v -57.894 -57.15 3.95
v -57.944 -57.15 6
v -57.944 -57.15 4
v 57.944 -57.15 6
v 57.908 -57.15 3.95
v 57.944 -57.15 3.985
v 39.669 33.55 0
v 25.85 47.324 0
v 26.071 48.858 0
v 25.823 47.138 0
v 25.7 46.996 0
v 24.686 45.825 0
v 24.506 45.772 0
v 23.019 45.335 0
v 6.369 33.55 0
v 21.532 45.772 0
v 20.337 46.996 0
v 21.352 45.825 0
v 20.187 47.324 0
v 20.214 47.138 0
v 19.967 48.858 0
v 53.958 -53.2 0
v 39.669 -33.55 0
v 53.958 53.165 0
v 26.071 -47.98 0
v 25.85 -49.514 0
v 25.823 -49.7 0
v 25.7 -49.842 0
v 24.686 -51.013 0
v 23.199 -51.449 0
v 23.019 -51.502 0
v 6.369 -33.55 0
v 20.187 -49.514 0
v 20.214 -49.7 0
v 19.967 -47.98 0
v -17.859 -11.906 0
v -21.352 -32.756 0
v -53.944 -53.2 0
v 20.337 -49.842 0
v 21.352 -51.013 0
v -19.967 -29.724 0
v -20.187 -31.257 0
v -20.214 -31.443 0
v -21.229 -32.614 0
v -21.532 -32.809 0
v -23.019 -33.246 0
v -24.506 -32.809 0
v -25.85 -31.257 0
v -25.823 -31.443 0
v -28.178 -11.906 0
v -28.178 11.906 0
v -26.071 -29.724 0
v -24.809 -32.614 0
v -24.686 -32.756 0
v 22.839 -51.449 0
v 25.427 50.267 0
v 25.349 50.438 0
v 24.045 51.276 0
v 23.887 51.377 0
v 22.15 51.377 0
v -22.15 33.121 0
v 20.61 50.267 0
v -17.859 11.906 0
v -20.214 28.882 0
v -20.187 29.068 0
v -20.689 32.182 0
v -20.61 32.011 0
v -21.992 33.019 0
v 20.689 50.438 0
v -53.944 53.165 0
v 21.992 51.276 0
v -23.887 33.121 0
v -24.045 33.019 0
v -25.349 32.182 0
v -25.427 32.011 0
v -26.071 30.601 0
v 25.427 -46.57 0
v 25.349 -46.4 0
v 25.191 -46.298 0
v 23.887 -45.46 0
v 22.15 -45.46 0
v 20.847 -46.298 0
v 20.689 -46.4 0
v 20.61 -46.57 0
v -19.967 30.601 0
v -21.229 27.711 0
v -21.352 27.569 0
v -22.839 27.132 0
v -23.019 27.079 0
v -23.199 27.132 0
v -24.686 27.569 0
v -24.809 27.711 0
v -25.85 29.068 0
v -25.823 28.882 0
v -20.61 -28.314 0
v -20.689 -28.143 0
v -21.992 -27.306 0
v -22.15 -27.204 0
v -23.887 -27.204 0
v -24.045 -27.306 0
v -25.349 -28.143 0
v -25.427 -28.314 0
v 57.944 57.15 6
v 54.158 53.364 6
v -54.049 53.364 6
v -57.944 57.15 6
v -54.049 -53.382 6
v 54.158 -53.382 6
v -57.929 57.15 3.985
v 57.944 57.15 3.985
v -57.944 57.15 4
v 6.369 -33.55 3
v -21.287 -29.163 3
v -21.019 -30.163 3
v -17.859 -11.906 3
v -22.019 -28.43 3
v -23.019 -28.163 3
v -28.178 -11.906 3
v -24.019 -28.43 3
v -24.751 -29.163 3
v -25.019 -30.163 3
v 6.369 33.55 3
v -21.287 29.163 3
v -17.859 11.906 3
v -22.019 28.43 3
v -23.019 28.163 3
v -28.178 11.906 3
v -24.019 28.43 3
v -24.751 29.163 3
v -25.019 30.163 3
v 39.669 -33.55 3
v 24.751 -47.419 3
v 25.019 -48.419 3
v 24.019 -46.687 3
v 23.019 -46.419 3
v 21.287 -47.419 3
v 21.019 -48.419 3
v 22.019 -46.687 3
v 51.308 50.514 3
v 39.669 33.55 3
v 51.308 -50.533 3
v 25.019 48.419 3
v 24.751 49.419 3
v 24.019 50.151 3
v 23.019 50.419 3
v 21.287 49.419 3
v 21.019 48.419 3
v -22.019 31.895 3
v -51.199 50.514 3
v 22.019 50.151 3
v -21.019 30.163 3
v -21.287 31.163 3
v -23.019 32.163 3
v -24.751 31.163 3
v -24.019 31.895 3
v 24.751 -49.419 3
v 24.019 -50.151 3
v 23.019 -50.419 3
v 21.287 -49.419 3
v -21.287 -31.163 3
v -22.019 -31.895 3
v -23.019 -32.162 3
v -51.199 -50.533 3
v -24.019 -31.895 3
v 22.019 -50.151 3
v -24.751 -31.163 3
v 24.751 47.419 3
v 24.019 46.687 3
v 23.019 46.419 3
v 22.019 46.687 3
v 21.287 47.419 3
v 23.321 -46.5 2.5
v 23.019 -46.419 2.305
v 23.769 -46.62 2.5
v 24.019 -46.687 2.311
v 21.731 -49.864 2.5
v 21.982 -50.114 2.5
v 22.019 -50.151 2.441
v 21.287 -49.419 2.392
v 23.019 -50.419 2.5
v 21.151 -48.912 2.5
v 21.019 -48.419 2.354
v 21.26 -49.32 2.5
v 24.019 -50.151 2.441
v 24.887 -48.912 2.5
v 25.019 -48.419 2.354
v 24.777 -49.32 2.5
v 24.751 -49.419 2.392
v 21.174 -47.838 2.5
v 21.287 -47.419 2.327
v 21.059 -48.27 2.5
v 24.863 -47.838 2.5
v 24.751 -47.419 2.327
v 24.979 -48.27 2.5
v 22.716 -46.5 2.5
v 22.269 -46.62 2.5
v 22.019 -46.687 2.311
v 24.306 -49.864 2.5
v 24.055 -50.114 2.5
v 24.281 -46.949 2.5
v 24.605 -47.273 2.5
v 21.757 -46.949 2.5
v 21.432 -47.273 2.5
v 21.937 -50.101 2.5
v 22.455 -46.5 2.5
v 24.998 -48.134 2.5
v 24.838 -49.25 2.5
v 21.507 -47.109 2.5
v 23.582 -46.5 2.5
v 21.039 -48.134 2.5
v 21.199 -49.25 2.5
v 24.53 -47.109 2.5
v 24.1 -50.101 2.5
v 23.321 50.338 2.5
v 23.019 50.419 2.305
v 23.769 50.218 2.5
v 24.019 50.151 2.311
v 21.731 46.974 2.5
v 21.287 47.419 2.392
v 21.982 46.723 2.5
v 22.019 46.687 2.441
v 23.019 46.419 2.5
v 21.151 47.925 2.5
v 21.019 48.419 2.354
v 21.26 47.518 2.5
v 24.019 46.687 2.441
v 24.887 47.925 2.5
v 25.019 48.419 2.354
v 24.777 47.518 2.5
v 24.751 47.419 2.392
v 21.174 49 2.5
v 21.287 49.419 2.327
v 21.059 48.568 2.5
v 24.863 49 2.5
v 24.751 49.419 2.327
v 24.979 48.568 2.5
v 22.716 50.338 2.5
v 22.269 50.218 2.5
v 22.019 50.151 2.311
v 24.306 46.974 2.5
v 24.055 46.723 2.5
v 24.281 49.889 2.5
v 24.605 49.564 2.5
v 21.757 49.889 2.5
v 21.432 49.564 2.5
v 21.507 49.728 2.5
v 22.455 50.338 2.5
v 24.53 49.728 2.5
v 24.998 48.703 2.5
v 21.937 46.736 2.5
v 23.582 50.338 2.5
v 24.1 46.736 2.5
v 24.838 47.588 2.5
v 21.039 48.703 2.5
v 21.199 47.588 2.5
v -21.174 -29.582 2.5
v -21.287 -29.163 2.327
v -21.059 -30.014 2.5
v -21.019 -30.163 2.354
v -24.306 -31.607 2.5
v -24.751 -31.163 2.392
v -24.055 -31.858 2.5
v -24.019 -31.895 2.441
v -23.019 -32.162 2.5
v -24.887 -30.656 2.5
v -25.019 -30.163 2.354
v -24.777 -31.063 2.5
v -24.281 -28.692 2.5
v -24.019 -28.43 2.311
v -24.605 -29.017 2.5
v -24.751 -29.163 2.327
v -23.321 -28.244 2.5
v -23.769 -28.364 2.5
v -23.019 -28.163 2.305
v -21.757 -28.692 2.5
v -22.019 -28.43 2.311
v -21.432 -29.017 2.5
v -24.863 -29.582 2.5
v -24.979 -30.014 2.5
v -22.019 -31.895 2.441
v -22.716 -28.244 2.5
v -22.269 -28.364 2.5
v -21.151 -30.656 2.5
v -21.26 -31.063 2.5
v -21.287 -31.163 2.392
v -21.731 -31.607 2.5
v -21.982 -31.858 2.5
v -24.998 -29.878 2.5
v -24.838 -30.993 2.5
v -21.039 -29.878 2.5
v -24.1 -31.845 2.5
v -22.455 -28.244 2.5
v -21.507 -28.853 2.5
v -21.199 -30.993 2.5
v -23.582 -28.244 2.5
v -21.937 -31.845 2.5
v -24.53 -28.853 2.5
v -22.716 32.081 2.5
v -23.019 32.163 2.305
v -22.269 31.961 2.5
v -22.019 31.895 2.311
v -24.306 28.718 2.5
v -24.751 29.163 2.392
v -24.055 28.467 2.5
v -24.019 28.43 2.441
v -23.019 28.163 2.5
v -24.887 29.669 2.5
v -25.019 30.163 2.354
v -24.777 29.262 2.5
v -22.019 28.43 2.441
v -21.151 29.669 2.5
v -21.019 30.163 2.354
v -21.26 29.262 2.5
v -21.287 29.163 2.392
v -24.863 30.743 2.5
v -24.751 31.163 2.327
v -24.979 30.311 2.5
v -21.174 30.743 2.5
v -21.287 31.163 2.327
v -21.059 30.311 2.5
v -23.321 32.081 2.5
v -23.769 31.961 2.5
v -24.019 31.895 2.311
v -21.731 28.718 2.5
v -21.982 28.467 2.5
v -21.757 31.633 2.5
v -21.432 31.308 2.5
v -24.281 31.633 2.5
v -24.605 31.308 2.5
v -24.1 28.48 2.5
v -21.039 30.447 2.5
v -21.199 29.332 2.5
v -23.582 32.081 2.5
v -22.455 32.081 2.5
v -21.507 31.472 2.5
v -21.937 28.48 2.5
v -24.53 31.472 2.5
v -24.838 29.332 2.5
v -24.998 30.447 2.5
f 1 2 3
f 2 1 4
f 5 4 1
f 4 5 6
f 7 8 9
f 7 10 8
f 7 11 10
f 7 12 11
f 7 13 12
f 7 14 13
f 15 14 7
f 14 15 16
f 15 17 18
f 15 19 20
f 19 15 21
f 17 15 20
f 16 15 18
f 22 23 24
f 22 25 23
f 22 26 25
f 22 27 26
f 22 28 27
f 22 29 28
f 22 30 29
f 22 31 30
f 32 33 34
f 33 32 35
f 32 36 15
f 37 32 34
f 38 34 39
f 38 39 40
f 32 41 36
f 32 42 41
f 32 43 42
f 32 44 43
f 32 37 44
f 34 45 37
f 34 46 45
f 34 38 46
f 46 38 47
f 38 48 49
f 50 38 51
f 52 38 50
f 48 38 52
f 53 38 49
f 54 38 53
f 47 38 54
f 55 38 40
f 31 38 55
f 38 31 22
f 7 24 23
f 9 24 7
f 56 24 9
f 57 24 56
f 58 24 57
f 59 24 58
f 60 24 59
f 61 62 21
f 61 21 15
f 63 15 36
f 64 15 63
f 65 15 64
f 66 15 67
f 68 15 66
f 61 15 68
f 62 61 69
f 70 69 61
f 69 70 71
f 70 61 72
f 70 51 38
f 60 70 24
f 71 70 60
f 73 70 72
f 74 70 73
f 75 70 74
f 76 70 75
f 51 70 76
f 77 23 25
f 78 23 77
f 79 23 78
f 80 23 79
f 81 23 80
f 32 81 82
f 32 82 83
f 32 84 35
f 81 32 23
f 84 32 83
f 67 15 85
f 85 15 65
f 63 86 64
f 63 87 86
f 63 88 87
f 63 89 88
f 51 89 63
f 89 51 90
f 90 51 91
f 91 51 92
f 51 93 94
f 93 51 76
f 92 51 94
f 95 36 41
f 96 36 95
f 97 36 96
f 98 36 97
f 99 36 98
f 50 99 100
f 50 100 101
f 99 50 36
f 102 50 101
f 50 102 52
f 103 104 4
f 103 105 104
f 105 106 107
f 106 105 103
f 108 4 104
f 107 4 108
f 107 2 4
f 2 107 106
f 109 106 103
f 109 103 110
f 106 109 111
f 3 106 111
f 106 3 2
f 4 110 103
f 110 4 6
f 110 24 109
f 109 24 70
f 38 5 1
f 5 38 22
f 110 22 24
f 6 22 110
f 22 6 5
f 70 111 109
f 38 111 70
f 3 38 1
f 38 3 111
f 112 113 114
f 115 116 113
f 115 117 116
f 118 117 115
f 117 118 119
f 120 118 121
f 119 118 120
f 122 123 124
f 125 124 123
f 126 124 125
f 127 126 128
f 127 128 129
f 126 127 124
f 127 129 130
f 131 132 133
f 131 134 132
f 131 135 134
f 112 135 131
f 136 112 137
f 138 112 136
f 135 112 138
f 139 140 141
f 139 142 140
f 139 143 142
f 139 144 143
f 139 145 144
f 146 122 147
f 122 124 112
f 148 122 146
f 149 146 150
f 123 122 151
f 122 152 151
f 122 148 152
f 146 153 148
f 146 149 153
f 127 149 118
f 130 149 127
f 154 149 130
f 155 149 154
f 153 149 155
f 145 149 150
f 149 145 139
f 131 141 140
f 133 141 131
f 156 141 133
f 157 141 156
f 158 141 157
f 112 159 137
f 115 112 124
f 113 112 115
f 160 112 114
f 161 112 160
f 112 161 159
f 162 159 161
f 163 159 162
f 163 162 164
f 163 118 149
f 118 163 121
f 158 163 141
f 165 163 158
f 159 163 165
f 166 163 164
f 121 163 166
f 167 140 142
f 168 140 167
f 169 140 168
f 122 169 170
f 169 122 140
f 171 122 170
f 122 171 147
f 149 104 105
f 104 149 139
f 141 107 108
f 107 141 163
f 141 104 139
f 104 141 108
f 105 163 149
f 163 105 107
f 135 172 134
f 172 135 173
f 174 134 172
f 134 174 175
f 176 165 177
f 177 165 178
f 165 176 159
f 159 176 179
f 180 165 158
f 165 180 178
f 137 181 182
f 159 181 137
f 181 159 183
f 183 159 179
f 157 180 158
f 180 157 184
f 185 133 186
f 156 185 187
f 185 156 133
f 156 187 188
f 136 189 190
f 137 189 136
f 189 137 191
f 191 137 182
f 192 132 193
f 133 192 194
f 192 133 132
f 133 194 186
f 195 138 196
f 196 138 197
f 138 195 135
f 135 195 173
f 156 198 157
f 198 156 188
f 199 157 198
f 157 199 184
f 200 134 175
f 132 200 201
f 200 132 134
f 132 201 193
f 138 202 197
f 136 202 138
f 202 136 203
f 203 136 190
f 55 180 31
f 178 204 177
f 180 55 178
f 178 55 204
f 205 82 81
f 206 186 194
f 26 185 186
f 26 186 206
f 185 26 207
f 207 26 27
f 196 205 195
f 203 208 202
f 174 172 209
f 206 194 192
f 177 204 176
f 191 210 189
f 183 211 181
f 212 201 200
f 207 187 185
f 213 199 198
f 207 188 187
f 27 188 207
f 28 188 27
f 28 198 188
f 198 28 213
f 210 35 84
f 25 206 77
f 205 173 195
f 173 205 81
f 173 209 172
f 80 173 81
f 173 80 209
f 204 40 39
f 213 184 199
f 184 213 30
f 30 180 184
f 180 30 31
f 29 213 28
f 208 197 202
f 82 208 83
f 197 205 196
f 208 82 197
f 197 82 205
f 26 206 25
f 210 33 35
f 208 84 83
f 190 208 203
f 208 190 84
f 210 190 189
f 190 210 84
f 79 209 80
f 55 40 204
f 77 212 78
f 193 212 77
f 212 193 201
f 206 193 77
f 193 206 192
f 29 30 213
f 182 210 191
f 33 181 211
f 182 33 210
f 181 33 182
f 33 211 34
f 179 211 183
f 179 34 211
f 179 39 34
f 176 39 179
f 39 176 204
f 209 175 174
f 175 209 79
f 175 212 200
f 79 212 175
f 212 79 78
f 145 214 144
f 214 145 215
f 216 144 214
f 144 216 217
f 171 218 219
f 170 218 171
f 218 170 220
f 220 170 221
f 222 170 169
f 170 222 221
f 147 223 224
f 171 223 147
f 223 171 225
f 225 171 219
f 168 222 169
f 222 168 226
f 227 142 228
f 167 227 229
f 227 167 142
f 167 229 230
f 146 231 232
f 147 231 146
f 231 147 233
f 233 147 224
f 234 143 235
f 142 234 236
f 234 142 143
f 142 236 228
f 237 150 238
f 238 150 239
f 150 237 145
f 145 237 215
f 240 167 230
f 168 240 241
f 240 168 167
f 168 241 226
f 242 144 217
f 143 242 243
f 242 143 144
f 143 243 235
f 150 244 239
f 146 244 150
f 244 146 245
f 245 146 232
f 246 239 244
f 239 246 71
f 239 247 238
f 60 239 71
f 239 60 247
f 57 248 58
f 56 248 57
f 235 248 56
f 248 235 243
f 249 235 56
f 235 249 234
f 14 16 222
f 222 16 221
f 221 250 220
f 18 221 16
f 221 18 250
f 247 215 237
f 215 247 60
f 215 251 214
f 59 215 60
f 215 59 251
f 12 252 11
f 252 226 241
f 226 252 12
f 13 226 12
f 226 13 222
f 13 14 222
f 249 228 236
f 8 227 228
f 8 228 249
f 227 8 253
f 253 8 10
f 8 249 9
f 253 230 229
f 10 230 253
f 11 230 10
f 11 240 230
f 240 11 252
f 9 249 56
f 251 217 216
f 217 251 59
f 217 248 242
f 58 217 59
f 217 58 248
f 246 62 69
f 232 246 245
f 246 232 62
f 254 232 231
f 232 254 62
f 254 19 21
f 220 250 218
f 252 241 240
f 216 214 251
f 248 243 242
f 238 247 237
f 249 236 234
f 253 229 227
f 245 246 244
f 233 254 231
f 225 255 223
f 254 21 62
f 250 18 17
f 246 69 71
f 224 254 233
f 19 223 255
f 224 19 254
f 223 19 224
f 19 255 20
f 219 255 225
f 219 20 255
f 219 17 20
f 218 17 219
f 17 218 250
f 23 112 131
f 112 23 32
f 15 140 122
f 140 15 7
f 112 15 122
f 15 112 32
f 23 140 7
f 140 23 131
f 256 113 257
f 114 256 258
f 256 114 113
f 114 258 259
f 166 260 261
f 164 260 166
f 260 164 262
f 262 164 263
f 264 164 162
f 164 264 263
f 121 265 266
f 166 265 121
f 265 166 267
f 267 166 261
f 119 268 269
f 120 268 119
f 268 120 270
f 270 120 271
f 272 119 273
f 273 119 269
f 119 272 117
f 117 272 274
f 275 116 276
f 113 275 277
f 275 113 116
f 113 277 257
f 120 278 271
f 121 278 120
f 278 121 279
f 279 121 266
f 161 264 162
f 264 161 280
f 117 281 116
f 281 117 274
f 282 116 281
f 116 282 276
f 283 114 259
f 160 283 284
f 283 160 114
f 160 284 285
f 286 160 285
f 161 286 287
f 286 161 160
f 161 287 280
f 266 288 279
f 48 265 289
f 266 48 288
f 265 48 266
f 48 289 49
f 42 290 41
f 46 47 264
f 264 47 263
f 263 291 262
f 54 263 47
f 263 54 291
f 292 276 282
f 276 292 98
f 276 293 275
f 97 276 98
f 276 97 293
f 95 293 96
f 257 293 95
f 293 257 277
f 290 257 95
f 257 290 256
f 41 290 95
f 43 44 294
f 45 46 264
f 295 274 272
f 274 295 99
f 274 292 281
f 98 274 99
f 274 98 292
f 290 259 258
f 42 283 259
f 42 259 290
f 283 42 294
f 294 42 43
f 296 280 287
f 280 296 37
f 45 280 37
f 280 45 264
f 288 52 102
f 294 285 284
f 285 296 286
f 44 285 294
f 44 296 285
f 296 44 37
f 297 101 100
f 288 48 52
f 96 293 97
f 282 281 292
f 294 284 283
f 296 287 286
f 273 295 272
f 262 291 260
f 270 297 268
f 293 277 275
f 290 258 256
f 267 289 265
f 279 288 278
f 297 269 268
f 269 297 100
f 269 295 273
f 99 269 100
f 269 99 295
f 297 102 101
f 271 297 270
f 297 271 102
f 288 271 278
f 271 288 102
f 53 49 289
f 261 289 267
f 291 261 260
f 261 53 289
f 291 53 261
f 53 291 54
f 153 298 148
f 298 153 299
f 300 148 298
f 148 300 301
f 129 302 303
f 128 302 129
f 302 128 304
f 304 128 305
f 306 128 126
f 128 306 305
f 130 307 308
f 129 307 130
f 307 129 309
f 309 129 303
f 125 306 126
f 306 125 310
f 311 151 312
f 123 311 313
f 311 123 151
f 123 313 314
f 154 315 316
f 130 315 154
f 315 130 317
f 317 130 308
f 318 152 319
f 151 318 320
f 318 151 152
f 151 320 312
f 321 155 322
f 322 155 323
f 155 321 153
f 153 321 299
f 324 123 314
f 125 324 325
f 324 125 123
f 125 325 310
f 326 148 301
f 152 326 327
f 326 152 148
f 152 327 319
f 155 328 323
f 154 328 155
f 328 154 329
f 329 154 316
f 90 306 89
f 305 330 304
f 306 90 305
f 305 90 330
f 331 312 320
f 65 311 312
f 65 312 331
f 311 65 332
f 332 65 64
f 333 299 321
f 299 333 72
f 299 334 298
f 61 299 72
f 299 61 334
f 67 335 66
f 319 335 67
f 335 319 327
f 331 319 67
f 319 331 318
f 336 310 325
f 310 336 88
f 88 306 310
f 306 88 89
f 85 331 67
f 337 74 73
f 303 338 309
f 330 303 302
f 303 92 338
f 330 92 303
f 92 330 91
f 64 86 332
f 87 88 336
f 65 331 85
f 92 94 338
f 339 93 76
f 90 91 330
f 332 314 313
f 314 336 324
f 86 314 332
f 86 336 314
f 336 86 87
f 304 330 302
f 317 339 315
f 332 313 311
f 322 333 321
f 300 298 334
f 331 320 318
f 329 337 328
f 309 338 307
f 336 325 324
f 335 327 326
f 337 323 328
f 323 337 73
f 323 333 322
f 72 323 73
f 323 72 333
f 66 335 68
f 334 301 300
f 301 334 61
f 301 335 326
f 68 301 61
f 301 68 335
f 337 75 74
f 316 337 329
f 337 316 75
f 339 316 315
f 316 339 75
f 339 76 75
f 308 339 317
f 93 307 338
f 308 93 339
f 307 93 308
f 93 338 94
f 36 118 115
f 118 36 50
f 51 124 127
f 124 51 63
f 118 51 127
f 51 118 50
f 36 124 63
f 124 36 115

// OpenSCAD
// WALLY - Wall Plate Customizer v1.3
// by TheNewHobbyist 2013 (http://thenewhobbyist.com)
// http://www.thingiverse.com/thing:47956
//
// Most of the connectors used with this thing are panel mount connectors from
// www.DataPro.net I can't vouch for their quality but they did have easy to
// find dimensions for their products so I used them.
//
// This could be tightened up considerably but I thought I'd get it out there for people
// to experiment with before I lose my mind staring at it too long. Also this is my
// first OpenSCAD model so cut me some slack ;)
//
//   Notes:
//
// * The plug types "Duplex Outlet", "Long_Toggle Switch", "Toggle Switch", and "Rocker"
//   will all use the entire plate when selected in top or bottom configuration. The
//   other selection (if not "none" will be selected.
//
// * "None" and "Blank should not be considered equal. if "None" is selected for one of
//   the two holes on a plate the other selection will be centered on that plate. If
//   "Blank" is selected that plug location will remain blank but the other selection
//   will NOT move into a centered position.
//
//	Change Log:
//
//	v1.1
//	UPDATED: Screw hole locations for designer and toggle plate types.
//	UPDATED: Hole size for designer plate type.
//	UPDATED: Outlet hole spacing
//
//	v1.2
//	ADDED: Long Toggle Switch for laird
//
//	v1.3
//	ADDED: 3 new sizes for plate export: Standard, Junior-Jumbo, and Jumbo.
//

  //////////////////////////
 // Customizer Settings: //
//////////////////////////

//How big are we talkin' here?
plate_width = 2; //	[1:5]

// Bigger hole in your wall? Try this
plate_size = 0; // [0:Standard, 1:Junior-Jumbo, 2:Jumbo]

//Pick a plug or full plate type
1st_plate = "rocker";  //	["none":None, "blank":Blank Port, "toggle":Full Plate - Toggle Switch, "long_toggle":Full Plate - Long Toggle Switch, "outlet":Full Plate - Duplex Outlet, "rocker":Full Plate - Rocker/Designer Plate, "keystone1":Keystone Jack, "vga":VGA Port, "hdmi":HDMI Port, "dvi":DVI-I Port, "displayport":Displayport, "cat5e":Cat5e/Cat6 Port, "usb-a":USB-A Port, "usb-b":USB-B Port, "firewire":Firewire IEEE 1394 Port, "db09":DB-09 Port, "ps2":PS2 Port, "f-type": F-Type/Coaxial Port,"svideo":S-Video Port, "stereo":Stereo Headphone Jack]
//Pick a bottom plug type or leave as none
1st_plate_bottom_hole = "none";  //	["none":None, "blank":Blank Port, "keystone1":Keystone Jack, "vga":VGA Port, "hdmi":HDMI Port, "dvi":DVI-I Port, "displayport":Displayport, "cat5e":Cat5e/Cat6 Port, "usb-a":USB-A Port, "usb-b":USB-B Port, "firewire":Firewire IEEE 1394 Port, "db09":DB-09 Port, "ps2":PS2 Port, "f-type": F-Type/Coaxial Port,"svideo":S-Video Port, "stereo":Stereo Headphone Jack]
//Pick a plug or full plate type
2nd_plate = "toggle";  //	["none":None, "blank":Blank Port, "toggle":Full Plate - Toggle Switch, "long_toggle":Full Plate - Long Toggle Switch, "outlet":Full Plate - Duplex Outlet, "rocker":Full Plate - Rocker/Designer Plate, "keystone1":Keystone Jack, "vga":VGA Port, "hdmi":HDMI Port, "dvi":DVI-I Port, "displayport":Displayport, "cat5e":Cat5e/Cat6 Port, "usb-a":USB-A Port, "usb-b":USB-B Port, "firewire":Firewire IEEE 1394 Port, "db09":DB-09 Port, "ps2":PS2 Port, "f-type": F-Type/Coaxial Port,"svideo":S-Video Port, "stereo":Stereo Headphone Jack]
//Pick a bottom plug type or leave as none
2nd_plate_bottom_hole = "none";  //	["none":None, "blank":Blank Port, "keystone1":Keystone Jack, "vga":VGA Port, "hdmi":HDMI Port, "dvi":DVI-I Port, "displayport":Displayport, "cat5e":Cat5e/Cat6 Port, "usb-a":USB-A Port, "usb-b":USB-B Port, "firewire":Firewire IEEE 1394 Port, "db09":DB-09 Port, "ps2":PS2 Port, "f-type": F-Type/Coaxial Port,"svideo":S-Video Port, "stereo":Stereo Headphone Jack]
//Pick a plug or full plate type
3rd_plate = "none";  //	["none":None, "blank":Blank Port, "toggle":Full Plate - Toggle Switch, "long_toggle":Full Plate - Long Toggle Switch, "outlet":Full Plate - Duplex Outlet, "rocker":Full Plate - Rocker/Designer Plate, "keystone1":Keystone Jack, "vga":VGA Port, "hdmi":HDMI Port, "dvi":DVI-I Port, "displayport":Displayport, "cat5e":Cat5e/Cat6 Port, "usb-a":USB-A Port, "usb-b":USB-B Port, "firewire":Firewire IEEE 1394 Port, "db09":DB-09 Port, "ps2":PS2 Port, "f-type": F-Type/Coaxial Port,"svideo":S-Video Port, "stereo":Stereo Headphone Jack]
//Pick a bottom plug type or leave as none
3rd_plate_bottom_hole = "none";  //	["none":None, "blank":Blank Port, "keystone1":Keystone Jack, "vga":VGA Port, "hdmi":HDMI Port, "dvi":DVI-I Port, "displayport":Displayport, "cat5e":Cat5e/Cat6 Port, "usb-a":USB-A Port, "usb-b":USB-B Port, "firewire":Firewire IEEE 1394 Port, "db09":DB-09 Port, "ps2":PS2 Port, "f-type": F-Type/Coaxial Port,"svideo":S-Video Port, "stereo":Stereo Headphone Jack]
//Pick a plug or full plate type
4th_plate = "none";  //["none":None, "blank":Blank Port, "toggle":Full Plate - Toggle Switch, "long_toggle":Full Plate - Long Toggle Switch, "outlet":Full Plate - Duplex Outlet, "rocker":Full Plate - Rocker/Designer Plate, "keystone1":Keystone Jack, "vga":VGA Port, "hdmi":HDMI Port, "dvi":DVI-I Port, "displayport":Displayport, "cat5e":Cat5e/Cat6 Port, "usb-a":USB-A Port, "usb-b":USB-B Port, "firewire":Firewire IEEE 1394 Port, "db09":DB-09 Port, "ps2":PS2 Port, "f-type": F-Type/Coaxial Port,"svideo":S-Video Port, "stereo":Stereo Headphone Jack]
//Pick a bottom plug type or leave as none
4th_plate_bottom_hole = "none";  //	["none":None, "blank":Blank Port, "keystone1":Keystone Jack, "vga":VGA Port, "hdmi":HDMI Port, "dvi":DVI-I Port, "displayport":Displayport, "cat5e":Cat5e/Cat6 Port, "usb-a":USB-A Port, "usb-b":USB-B Port, "firewire":Firewire IEEE 1394 Port, "db09":DB-09 Port, "ps2":PS2 Port, "f-type": F-Type/Coaxial Port,"svideo":S-Video Port, "stereo":Stereo Headphone Jack]
//Pick a plug or full plate type
5th_plate = "none";  //["none":None, "blank":Blank Port, "toggle":Full Plate - Toggle Switch, "long_toggle":Full Plate - Long Toggle Switch, "outlet":Full Plate - Duplex Outlet, "rocker":Full Plate - Rocker/Designer Plate, "keystone1":Keystone Jack, "vga":VGA Port, "hdmi":HDMI Port, "dvi":DVI-I Port, "displayport":Displayport, "cat5e":Cat5e/Cat6 Port, "usb-a":USB-A Port, "usb-b":USB-B Port, "firewire":Firewire IEEE 1394 Port, "db09":DB-09 Port, "ps2":PS2 Port, "f-type": F-Type/Coaxial Port,"svideo":S-Video Port, "stereo":Stereo Headphone Jack]
//Pick a bottom plug type or leave as none
5th_plate_bottom_hole = "none";  //	["none":None, "blank":Blank Port, "keystone1":Keystone Jack, "vga":VGA Port, "hdmi":HDMI Port, "dvi":DVI-I Port, "displayport":Displayport, "cat5e":Cat5e/Cat6 Port, "usb-a":USB-A Port, "usb-b":USB-B Port, "firewire":Firewire IEEE 1394 Port, "db09":DB-09 Port, "ps2":PS2 Port, "f-type": F-Type/Coaxial Port,"svideo":S-Video Port, "stereo":Stereo Headphone Jack]

  //////////////////////
 // Static Settings: //
//////////////////////

module GoAwayCustomizer() {
// This module is here to stop Customizer from picking up the variables below
}

l_offset = [34.925,39.6875,44.45];
r_offset = [34.925,39.6875,44.45];
spacer = [0,0,46.0375,92.075,138.1125,184.15];
solid_plate_width = l_offset[plate_size] + spacer[plate_width] + r_offset[plate_size];

height_sizes = [114.3,123.825,133.35];

height = 114.3; //plate height (static)
gang_width=[0,69.86,115.824,161.925,206.375,254]; // Plate widths (standard)

edgewidth = solid_plate_width + 10; // Bevel setting for top and bottom
rightbevel = solid_plate_width - 4; // Bevel for right side (scales)

left_offset = 34.925; // Offset first hole position
switch_offset = 46.0375; // Offset all additional holes
thinner_offset=[0,0.92,0.95,0.96,0.97,0.973]; // Manual fix for right side wackiness

positions=[height_sizes[plate_size]/2,height_sizes[plate_size]/2 - 14.25,height_sizes[plate_size]/2 + 14.25];

// preview[view:north, tilt:bottom]

  ///////////////////
 // Hole Control: //
///////////////////

module plate1(){
	if (1st_plate == "toggle" || 1st_plate_bottom_hole == "toggle"){
		translate([0,l_offset[plate_size],0]) toggle_screws();
		translate([0,l_offset[plate_size],0]) hole("toggle");
		}
	else if (1st_plate == "long_toggle" || 1st_plate_bottom_hole == "long_toggle"){
		translate([0,l_offset[plate_size],0]) toggle_screws();
		translate([0,l_offset[plate_size],0]) hole("long_toggle");
		}
	else if (1st_plate == "rocker" || 1st_plate_bottom_hole == "rocker"){
		translate([0,l_offset[plate_size],0]) rocker_screws();
		translate([0,l_offset[plate_size],0]) hole("rocker");
		}
	else if (1st_plate == "outlet" || 1st_plate_bottom_hole == "outlet") {
	translate([0,l_offset[plate_size],0]) hole("outlet");
	}
	else if (1st_plate_bottom_hole == "none") {
		translate([0,l_offset[plate_size],0]) box_screws();
		translate([positions[0],l_offset[plate_size],0]) hole(1st_plate);
			}
	else if (1st_plate == "none") {
		translate([0,l_offset[plate_size],0]) box_screws();
		translate([positions[0],l_offset[plate_size],0]) hole(1st_plate_bottom_hole);
			}
	else {
	translate([0,l_offset[plate_size],0]) box_screws();
	translate([positions[1],l_offset[plate_size],0]) hole(1st_plate);
	translate([positions[2],l_offset[plate_size],0]) hole(1st_plate_bottom_hole);
	}
}

module plate2(){
	if (2nd_plate == "toggle" || 2nd_plate_bottom_hole == "toggle"){
		translate([0,l_offset[plate_size] + switch_offset,0]) toggle_screws();
		translate([0,l_offset[plate_size] + switch_offset,0]) hole("toggle");
		}
	else if (2nd_plate == "long_toggle" || 2nd_plate_bottom_hole == "long_toggle"){
		translate([0,l_offset[plate_size] + switch_offset,0]) toggle_screws();
		translate([0,l_offset[plate_size] + switch_offset,0]) hole("long_toggle");
		}
	else if (2nd_plate == "rocker" || 2nd_plate_bottom_hole == "rocker"){
		translate([0,l_offset[plate_size] + switch_offset,0]) rocker_screws();
		translate([0,l_offset[plate_size] + switch_offset,0]) hole("rocker");
		}
	else if (2nd_plate == "outlet" || 2nd_plate_bottom_hole == "outlet") {
	translate([0,l_offset[plate_size] + switch_offset,0]) hole("outlet");
	}
	else if (2nd_plate_bottom_hole == "none") {
		translate([0,l_offset[plate_size] + switch_offset,0]) box_screws();
		translate([positions[0],l_offset[plate_size] + switch_offset,0]) hole(2nd_plate);
			}
	else if (2nd_plate == "none") {
		translate([0,l_offset[plate_size] + switch_offset,0]) box_screws();
		translate([positions[0],l_offset[plate_size] + switch_offset,0]) hole(2nd_plate_bottom_hole);
			}
	else {
	translate([0,l_offset[plate_size] + switch_offset,0]) box_screws();
	translate([positions[1],l_offset[plate_size] + switch_offset,0]) hole(2nd_plate);
	translate([positions[2],l_offset[plate_size] + switch_offset,0]) hole(2nd_plate_bottom_hole);
	}
}

module plate3(){
	if (3rd_plate == "toggle" || 3rd_plate_bottom_hole == "toggle"){
		translate([0,l_offset[plate_size] + switch_offset * 2,0]) toggle_screws();
		translate([0,l_offset[plate_size] + switch_offset * 2,0]) hole("toggle");
		}
	else if (3rd_plate == "long_toggle" || 3rd_plate_bottom_hole == "long_toggle"){
		translate([0,l_offset[plate_size] + switch_offset * 2,0]) toggle_screws();
		translate([0,l_offset[plate_size] + switch_offset * 2,0]) hole("long_toggle");
		}
	else if (3rd_plate == "rocker" || 3rd_plate_bottom_hole == "rocker"){
		translate([0,l_offset[plate_size] + switch_offset * 2,0]) rocker_screws();
		translate([0,l_offset[plate_size] + switch_offset * 2,0]) hole("rocker");
		}
	else if (3rd_plate == "outlet" || 3rd_plate_bottom_hole == "outlet") {
	translate([0,l_offset[plate_size] + switch_offset * 2,0]) hole("outlet");
	}
	else if (3rd_plate_bottom_hole == "none") {
		translate([0,l_offset[plate_size] + switch_offset * 2,0]) box_screws();
		translate([positions[0],l_offset[plate_size] + switch_offset * 2,0]) hole(3rd_plate);
			}
	else if (3rd_plate == "none") {
		translate([0,l_offset[plate_size] + switch_offset * 2,0]) box_screws();
		translate([positions[0],l_offset[plate_size] + switch_offset * 2,0]) hole(3rd_plate_bottom_hole);
			}
	else {
	translate([0,l_offset[plate_size] + switch_offset * 2,0]) box_screws();
	translate([positions[1],l_offset[plate_size] + switch_offset * 2,0]) hole(3rd_plate);
	translate([positions[2],l_offset[plate_size] + switch_offset * 2,0]) hole(3rd_plate_bottom_hole);
	}
}

module plate4(){
	if (4th_plate == "toggle" || 4th_plate_bottom_hole == "toggle"){
		translate([0,l_offset[plate_size] + switch_offset * 3,0]) toggle_screws();
		translate([0,l_offset[plate_size] + switch_offset * 3,0]) hole("toggle");
		}
	else if (4th_plate == "long_toggle" || 4th_plate_bottom_hole == "long_toggle"){
		translate([0,l_offset[plate_size] + switch_offset * 3,0]) toggle_screws();
		translate([0,l_offset[plate_size] + switch_offset * 3,0]) hole("long_toggle");
		}
	else if (4th_plate == "rocker" || 4th_plate_bottom_hole == "rocker"){
		translate([0,l_offset[plate_size] + switch_offset * 3,0]) rocker_screws();
		translate([0,l_offset[plate_size] + switch_offset * 3,0]) hole("rocker");
		}
	else if (4th_plate == "outlet" || 4th_plate_bottom_hole == "outlet") {
	translate([0,l_offset[plate_size] + switch_offset * 3,0]) hole("outlet");
	}
	else if (4th_plate_bottom_hole == "none") {
		translate([0,l_offset[plate_size] + switch_offset * 3,0]) box_screws();
		translate([positions[0],l_offset[plate_size] + switch_offset * 3,0]) hole(4th_plate);
			}
	else if (4th_plate == "none") {
		translate([0,l_offset[plate_size] + switch_offset * 3,0]) box_screws();
		translate([positions[0],l_offset[plate_size] + switch_offset * 3,0]) hole(4th_plate_bottom_hole);
			}
	else {
	translate([0,l_offset[plate_size] + switch_offset * 3,0]) box_screws();
	translate([positions[1],l_offset[plate_size] + switch_offset * 3,0]) hole(4th_plate);
	translate([positions[2],l_offset[plate_size] + switch_offset * 3,0]) hole(4th_plate_bottom_hole);
	}
}

module plate5(){
	if (5th_plate == "toggle" || 5th_plate_bottom_hole == "toggle"){
		translate([0,l_offset[plate_size] + switch_offset * 4,0]) toggle_screws();
		translate([0,l_offset[plate_size] + switch_offset * 4,0]) hole("toggle");
		}
	else if (5th_plate == "long_toggle" || 5th_plate_bottom_hole == "long_toggle"){
		translate([0,l_offset[plate_size] + switch_offset * 4,0]) toggle_screws();
		translate([0,l_offset[plate_size] + switch_offset * 4,0]) hole("long_toggle");
		}
	else if (5th_plate == "rocker" || 5th_plate_bottom_hole == "rocker"){
		translate([0,l_offset[plate_size] + switch_offset * 4,0]) rocker_screws();
		translate([0,l_offset[plate_size] + switch_offset * 4,0]) hole("rocker");
		}
	else if (5th_plate == "outlet" || 5th_plate_bottom_hole == "outlet") {
	translate([0,l_offset[plate_size] + switch_offset * 4,0]) hole("outlet");
	}
	else if (5th_plate_bottom_hole == "none") {
		translate([0,l_offset[plate_size] + switch_offset * 4,0]) box_screws();
		translate([positions[0],l_offset[plate_size] + switch_offset * 4,0]) hole(5th_plate);
			}
	else if (5th_plate == "none") {
		translate([0,l_offset[plate_size] + switch_offset * 4,0]) box_screws();
		translate([positions[0],l_offset[plate_size] + switch_offset * 4,0]) hole(5th_plate_bottom_hole);
			}
	else {
	translate([0,l_offset[plate_size] + switch_offset * 4,0]) box_screws();
	translate([positions[1],l_offset[plate_size] + switch_offset * 4,0]) hole(5th_plate);
	translate([positions[2],l_offset[plate_size] + switch_offset * 4,0]) hole(5th_plate_bottom_hole);
	}
}

  /////////////////
 // SolidWorks: //
/////////////////

module plate1_solid(){
if (1st_plate == "keystone1" && 1st_plate_bottom_hole == "none") {
	translate([height_sizes[plate_size]/2 + 14.3,l_offset[plate_size] - 11.5,-3.9]) hole("keystone_solid");
	}
else if (1st_plate == "keystone1" && 1st_plate_bottom_hole != "outlet" && 1st_plate_bottom_hole != "toggle" && 1st_plate_bottom_hole != "rocker") {
	translate([height_sizes[plate_size]/2,l_offset[plate_size] - 11.5,-3.9]) hole("keystone_solid");
	}
if (1st_plate_bottom_hole == "keystone1" && 1st_plate == "none") {
	translate([height_sizes[plate_size]/2 + 14.3,l_offset[plate_size] - 11.5,-3.9]) hole("keystone_solid");
	}
else if (1st_plate_bottom_hole == "keystone1" && 1st_plate != "outlet" && 1st_plate != "toggle" && 1st_plate != "rocker") {
	translate([height_sizes[plate_size]/2 + 28.5,l_offset[plate_size] - 11.5,-3.9]) hole("keystone_solid");
	}

}

module plate2_solid(){
if (2nd_plate == "keystone1" && 2nd_plate_bottom_hole == "none") {
	translate([height_sizes[plate_size]/2 + 14.3,l_offset[plate_size] - 11.5 + switch_offset,-3.9]) hole("keystone_solid");
	}
else if (2nd_plate == "keystone1" && 2nd_plate_bottom_hole != "outlet" && 2nd_plate_bottom_hole != "toggle" && 2nd_plate_bottom_hole != "rocker") {
	translate([height_sizes[plate_size]/2,l_offset[plate_size] - 11.5 + switch_offset,-3.9]) hole("keystone_solid");
	}
if (2nd_plate_bottom_hole == "keystone1" && 2nd_plate == "none") {
	translate([height_sizes[plate_size]/2 + 14.3,l_offset[plate_size] - 11.5 + switch_offset,-3.9]) hole("keystone_solid");
	}
else if (2nd_plate_bottom_hole == "keystone1" && 2nd_plate != "outlet" && 2nd_plate != "toggle" && 2nd_plate != "rocker") {
	translate([height_sizes[plate_size]/2 + 28.5,l_offset[plate_size] - 11.5 + switch_offset,-3.9]) hole("keystone_solid");
	}

}

module plate3_solid(){
if (3rd_plate == "keystone1" && 3rd_plate_bottom_hole == "none") {
	translate([height_sizes[plate_size]/2 + 14.3,l_offset[plate_size] - 11.5 + switch_offset * 2,-3.9]) hole("keystone_solid");
	}
else if (3rd_plate == "keystone1" && 3rd_plate_bottom_hole != "outlet" && 3rd_plate_bottom_hole != "toggle" && 3rd_plate_bottom_hole != "rocker") {
	translate([height_sizes[plate_size]/2,l_offset[plate_size] - 11.5 + switch_offset * 2,-3.9]) hole("keystone_solid");
	}
if (3rd_plate_bottom_hole == "keystone1" && 3rd_plate == "none") {
	translate([height_sizes[plate_size]/2 + 14.3,l_offset[plate_size] - 11.5 + switch_offset * 2,-3.9]) hole("keystone_solid");
	}
else if (3rd_plate_bottom_hole == "keystone1" && 3rd_plate != "outlet" && 3rd_plate != "toggle" && 3rd_plate != "rocker") {
	translate([height_sizes[plate_size]/2 + 28.5,l_offset[plate_size] - 11.5 + switch_offset * 2,-3.9]) hole("keystone_solid");
	}

}

module plate4_solid(){
if (4th_plate == "keystone1" && 4th_plate_bottom_hole == "none") {
	translate([height_sizes[plate_size]/2 + 14.3,l_offset[plate_size] - 11.5 + switch_offset * 3,-3.9]) hole("keystone_solid");
	}
else if (4th_plate == "keystone1" && 4th_plate_bottom_hole != "outlet" && 4th_plate_bottom_hole != "toggle" && 4th_plate_bottom_hole != "rocker") {
	translate([height_sizes[plate_size]/2,l_offset[plate_size] - 11.5 + switch_offset * 3,-3.9]) hole("keystone_solid");
	}
if (4th_plate_bottom_hole == "keystone1" && 4th_plate == "none") {
	translate([height_sizes[plate_size]/2 + 14.3,l_offset[plate_size] - 11.5 + switch_offset * 3,-3.9]) hole("keystone_solid");
	}
else if (4th_plate_bottom_hole == "keystone1" && 4th_plate != "outlet" && 4th_plate != "toggle" && 4th_plate != "rocker") {
	translate([height_sizes[plate_size]/2 + 28.5,l_offset[plate_size] - 11.5 + switch_offset * 3,-3.9]) hole("keystone_solid");
	}

}

module plate5_solid(){
if (5th_plate == "keystone1" && 5th_plate_bottom_hole == "none") {
	translate([height_sizes[plate_size]/2 + 14.3,l_offset[plate_size] - 11.5 + switch_offset * 4,-3.9]) hole("keystone_solid");
	}
else if (5th_plate == "keystone1" && 5th_plate_bottom_hole != "outlet" && 5th_plate_bottom_hole != "toggle" && 5th_plate_bottom_hole != "rocker") {
	translate([height_sizes[plate_size]/2,l_offset[plate_size] - 11.5 + switch_offset * 4,-3.9]) hole("keystone_solid");
	}
if (5th_plate_bottom_hole == "keystone1" && 5th_plate == "none") {
	translate([height_sizes[plate_size]/2 + 14.3,l_offset[plate_size] - 11.5 + switch_offset * 4,-3.9]) hole("keystone_solid");
	}
else if (5th_plate_bottom_hole == "keystone1" && 5th_plate != "outlet" && 5th_plate != "toggle" && 5th_plate != "rocker") {
	translate([height_sizes[plate_size]/2 + 28.5,l_offset[plate_size] - 11.5 + switch_offset * 4,-3.9]) hole("keystone_solid");
	}

}

  ///////////////////
 // PlateStation: //
///////////////////

//Plate size and bevel
module plate() {
	difference() {
		cube([height_sizes[plate_size],solid_plate_width,6]);
		translate([-4.3,-5,6.2]) rotate([0,45,0]) cube([6,edgewidth,6]); //Top Bevel
		translate([height_sizes[plate_size]-4.2,-5,6.25]) rotate([0,45,0]) cube([6,edgewidth,6]); //Bottom Bevel
		translate([height_sizes[plate_size]+10,-4.4,6.1]) rotate([0,45,90]) cube([6,height_sizes[plate_size]+20,6]); //Left Bevel (doesn't change)
		translate([height_sizes[plate_size]+10,rightbevel,6]) rotate([0,45,90]) cube([6,height_sizes[plate_size]+10,6]); //Right Bevel (scales right)
				}
			}


// Thinning Plate
module plate_inner() {
	scale([0.95,thinner_offset[plate_width],1]){
	translate([3,3,0]){
	difference() {
		cube([height_sizes[plate_size],solid_plate_width,6]);
		translate([-4.3,-5,6.2]) rotate([0,45,0]) cube([6,edgewidth,6]); //Top Bevel
		translate([height_sizes[plate_size]-4.2,-5,6.25]) rotate([0,45,0]) cube([6,edgewidth,6]); //Bottom Bevel
		translate([height_sizes[plate_size]+10,-4.4,6.1]) rotate([0,45,90]) cube([6,height_sizes[plate_size]+20,6]); //Left Bevel (doesn't change)
		translate([height_sizes[plate_size]+10,rightbevel,6]) rotate([0,45,90]) cube([6,height_sizes[plate_size]+10,6]); //Right Bevel (scales right)
				}
			}
		}
	}

// Box screw holes
module box_screws(){
	 translate([height_sizes[plate_size]/2 + 41.67125,0,-1]) cylinder(r=2, h=10, $fn=12);
	 translate([height_sizes[plate_size]/2 + 41.67125,0,3.5]) cylinder(r1=2, r2=3.3, h=3);
	 translate([height_sizes[plate_size]/2 - 41.67125,0,-1]) cylinder(r=2, h=10, $fn=12);
	 translate([height_sizes[plate_size]/2 - 41.67125,0,3.5]) cylinder(r1=2, r2=3.3, h=3);
}

// Rocker/Designer screw holes
module rocker_screws(){
	 translate([height_sizes[plate_size]/2 + 48.41875,0,-1]) cylinder(r=2, h=10, $fn=12);
	 translate([height_sizes[plate_size]/2 + 48.41875,0,3.5]) cylinder(r1=2, r2=3.3, h=3);
	 translate([height_sizes[plate_size]/2 - 48.41875,0,-1]) cylinder(r=2, h=10, $fn=12);
	 translate([height_sizes[plate_size]/2 - 48.41875,0,3.5]) cylinder(r1=2, r2=3.3, h=3);
}

// Toggle screw holes
module toggle_screws(){
	 translate([height_sizes[plate_size]/2 + 30.1625,0,-1]) cylinder(r=2, h=10, $fn=12);
	 translate([height_sizes[plate_size]/2 + 30.1625,0,3.5]) cylinder(r1=2, r2=3.3, h=3);
	 translate([height_sizes[plate_size]/2 - 30.1625,0,-1]) cylinder(r=2, h=10, $fn=12);
	 translate([height_sizes[plate_size]/2 - 30.1625,0,3.5]) cylinder(r1=2, r2=3.3, h=3);
}

  ///////////////
 // Portland: //
///////////////

// Hole Cutout definitions
module hole(hole_type) {


// Toggle switch hole
	if (hole_type == "toggle") {
		translate([height_sizes[plate_size]/2,0,0]) cube([23.8125,10.3188,15], center = true);
		 						}

// Toggle switch hole and screw holes
	if (hole_type == "long_toggle") {
		translate([height_sizes[plate_size]/2,0,0]) cube([43.6563,11.9063,15], center = true);
		 						}

// Rocker switch plate
	if (hole_type == "rocker") {
		translate([height_sizes[plate_size]/2,0,0]) cube([67.1,33.3,15], center = true);

		 						}

// Duplex power outlet plate or dual side toggles
	if (hole_type == "outlet" || hole_type == "dualsidetoggle") {
		translate([height_sizes[plate_size]/2 + 19.3915,0,0]) {
			difference() {
				cylinder(r=17.4625, h=15, center = true);
				translate([-24.2875,-15,-2]) cube([10,37,15], center = false);
				translate([14.2875,-15,-2]) cube([10,37,15], center = false);
								}
							}
		translate([height_sizes[plate_size]/2 - 19.3915,0,0]){
			difference(){
				cylinder(r=17.4625, h=15, center = true);
				translate([-24.2875,-15,-2]) cube([10,37,15], center = false);
				translate([14.2875,-15,-2]) cube([10,37,15], center = false);
								}
							}
		translate([height_sizes[plate_size]/2,0,-1]) cylinder(r=2, h=10);
		translate([height_sizes[plate_size]/2,0,3.5]) cylinder(r1=2, r2=3.3, h=3);
							}

// Blank plate
	if (hole_type == "blank") { }

// VGA & DB09 plate
// VGA Fits http://www.datapro.net/products/vga-dual-panel-mount-f-f-cable.html
// DB09 Fits http://www.datapro.net/products/db9-serial-panel-mount-male-extension.html
	if (hole_type == "vga" || hole_type == "db09") {

			translate([0,-12.5,3]) cylinder(r=1.75, h=10, center = true);
			translate([0,12.5,3]) cylinder(r=1.75, h=10, center = true);
				difference(){
					cube([10,19,13], center=true);
					translate([-5,-9.2,1]) rotate([0,0,-35.6]) cube([4.4,2.4,15], center=true);
					translate([.9,-11.2,0]) rotate([0,0,9.6]) cube([10,4.8,15], center=true);
					translate([4.6,-8.5,0]) rotate([0,0,37.2]) cube([4.4,2.4,15], center=true);
					translate([-5,9.2,1]) rotate([0,0,35.6]) cube([4.4,2.4,15], center=true);
					translate([0.9,11.2,0]) rotate([0,0,-9.6]) cube([10,4.8,15], center=true);
					translate([4.6,8.5,0]) rotate([0,0,-37.2]) cube([4.4,2.4,15], center=true);
								}
						}

// HDMI plate
// Fits http://www.datapro.net/products/hdmi-panel-mount-extension-cable.html
	if (hole_type == "hdmi") {
		translate([0,-13,3]) cylinder(r=1.75, h=10, center = true);
		translate([0,13,3]) cylinder(r=1.75, h=10, center = true);
		translate([0,0,3]) cube([6,16,10], center=true);
							}

// DVI-I plate
// Fits http://www.datapro.net/products/dvi-i-panel-mount-extension-cable.html
	if (hole_type == "dvi") {
		translate([0,-16,3]) cylinder(r=1.75, h=10, center = true);
		translate([0,16,3]) cylinder(r=1.75, h=10, center = true);
		translate([0,0,3]) cube([10,26,10], center=true);
							}

// DisplayPort plate
// Fits http://www.datapro.net/products/dvi-i-panel-mount-extension-cable.html
	if (hole_type == "displayport") {
		translate([0,-13.5,3]) cylinder(r=1.75, h=10, center = true);
		translate([0,13.5,3]) cylinder(r=1.75, h=10, center = true);
		translate([0,0,0]){
			difference(){
				translate([0,0,3]) cube([7,19,10], center=true);
				translate([2.47,-9.37,3]) rotate([0,0,-54.6]) cube([3,5,14], center=true);
						}
								}
									}

// USB-A Plate
// Fits http://www.datapro.net/products/usb-panel-mount-type-a-cable.html
	if (hole_type == "usb-a") {
		translate([0,-15,3]) cylinder(r=1.75, h=10, center = true);
		translate([0,15,3]) cylinder(r=1.75, h=10, center = true);
		translate([0,0,3]) cube([8,16,10], center=true);
							}

// USB-B Plate
// Fits http://www.datapro.net/products/usb-panel-mount-type-b-cable.html
	if (hole_type == "usb-b") {
		translate([0,-13,3]) cylinder(r=1.75, h=10, center = true);
		translate([0,13,3]) cylinder(r=1.75, h=10, center = true);
		translate([0,0,3]) cube([11,12,10], center=true);
							}

// 1394 Firewire Plate
// Fits http://www.datapro.net/products/firewire-panel-mount-extension.html
	if (hole_type == "firewire") {
		translate([0,-13.5,3]) cylinder(r=1.75, h=10, center = true);
		translate([0,13.5,3]) cylinder(r=1.75, h=10, center = true);
		translate([0,0,3]) cube([7,12,10], center=true);
							}

// F-Type / Cable TV Plate
// Fits http://www.datapro.net/products/f-type-panel-mounting-coupler.html
	if (hole_type == "f-type") {
		translate([0,0,3]) cylinder(r=4.7625, h=10, center=true);
							}

// Cat5e & Gat6 plate
// Cat5e Fits http://www.datapro.net/products/cat-5e-panel-mount-ethernet.html
// Cat6 Fits hhttp://www.datapro.net/products/cat-6-panel-mount-ethernet.html
	if (hole_type == "cat5e" || hole_type == "cat6") {
		translate([0,-12.5,3]) cylinder(r=1.75, h=10, center = true);
		translate([0,12.5,3]) cylinder(r=1.75, h=10, center = true);
		translate([0,0,3]) cube([15,15,10], center=true);
		}

// S-Video & PS2 plate
// S-Video Fits hhttp://www.datapro.net/products/cat-6-panel-mount-ethernet.html
// PS2 http://www.datapro.net/products/ps2-panel-mount-extension-cable.html
	if (hole_type == "svideo" || hole_type == "ps2") {
		translate([0,-10,3]) cylinder(r=1.75, h=10, center = true);
		translate([0,10,3]) cylinder(r=1.75, h=10, center = true);
		translate([0,0,3]) cylinder(r=5, h=10, center=true);
		}


// Stereo / 1/4" headphone jack coupler
// Stereo coupler Fits http://www.datapro.net/products/stereo-panel-mount-coupler.html
	if (hole_type == "stereo") {
		translate([0,0,3]) cylinder(r=2.985, h=10, center=true);
		}

//Keystone1 hole
//Hole for 1 Keystone Jack
	if (hole_type == "keystone1") {
		translate([0,0,5]) cube([16.5,15,10], center = true);
	}

//Keystone Solid
	if (hole_type == "keystone_solid") {
		rotate([0,0,90]) {
			difference(){
				translate([0,0,.1]) cube([23,30.5,9.8]);
					translate([4,4,0]){
						difference(){
							cube([15,22.5,10]);
							translate([-1,-0.001,3.501]) cube([17,2,6.5]);
							translate([-1,2.5,-3.40970]) rotate([45,0,0]) cube([17,2,6.5]);
							translate([-1,18.501,6.001]) cube([17,4,4]);
							translate([-1,20.5,0]) rotate([-45,0,0]) cube([17,2,6.5]);
						}
					}
				}
			}
		}

//End of module "hole"
}

  ////////////////////////
 // Number One ENGAGE: //
////////////////////////

// Rotate so it sits correctly on plate (whoops) and make upside down
rotate([0,180,90]){
// put plate at 0,0,0 for easier printing
translate([-height_sizes[plate_size]/2,-solid_plate_width/2,-6]){

if (plate_width == 1) {
	difference() {
		plate();
		translate([0,0,-3]) plate_inner();
		plate1();
			}
		union() {
		plate1_solid();
		}
			}

else if (plate_width == 2) {
difference()
{
plate();
translate([0,0,-3]) plate_inner();
plate1();
plate2();
}
union() {
		plate1_solid();
		plate2_solid();
		}
}

else if (plate_width == 3) {
difference()
{
plate();
translate([0,0,-3]) plate_inner();
plate1();
plate2();
plate3();
}
union() {
		plate1_solid();
		plate2_solid();
		plate3_solid();
		}
}

else if (plate_width == 4) {
difference()
{
plate();
translate([0,0,-3]) plate_inner();
plate1();
plate2();
plate3();
plate4();
}
union() {
		plate1_solid();
		plate2_solid();
		plate3_solid();
		plate4_solid();
		}
}

else if (plate_width == 5) {
difference()
{
plate();
translate([0,0,-3]) plate_inner();
plate1();
plate2();
plate3();
plate4();
plate5();
}
union() {
		plate1_solid();
		plate2_solid();
		plate3_solid();
		plate4_solid();
		plate5_solid();
		}
}

//End Rotate
}
//End Translate
}
